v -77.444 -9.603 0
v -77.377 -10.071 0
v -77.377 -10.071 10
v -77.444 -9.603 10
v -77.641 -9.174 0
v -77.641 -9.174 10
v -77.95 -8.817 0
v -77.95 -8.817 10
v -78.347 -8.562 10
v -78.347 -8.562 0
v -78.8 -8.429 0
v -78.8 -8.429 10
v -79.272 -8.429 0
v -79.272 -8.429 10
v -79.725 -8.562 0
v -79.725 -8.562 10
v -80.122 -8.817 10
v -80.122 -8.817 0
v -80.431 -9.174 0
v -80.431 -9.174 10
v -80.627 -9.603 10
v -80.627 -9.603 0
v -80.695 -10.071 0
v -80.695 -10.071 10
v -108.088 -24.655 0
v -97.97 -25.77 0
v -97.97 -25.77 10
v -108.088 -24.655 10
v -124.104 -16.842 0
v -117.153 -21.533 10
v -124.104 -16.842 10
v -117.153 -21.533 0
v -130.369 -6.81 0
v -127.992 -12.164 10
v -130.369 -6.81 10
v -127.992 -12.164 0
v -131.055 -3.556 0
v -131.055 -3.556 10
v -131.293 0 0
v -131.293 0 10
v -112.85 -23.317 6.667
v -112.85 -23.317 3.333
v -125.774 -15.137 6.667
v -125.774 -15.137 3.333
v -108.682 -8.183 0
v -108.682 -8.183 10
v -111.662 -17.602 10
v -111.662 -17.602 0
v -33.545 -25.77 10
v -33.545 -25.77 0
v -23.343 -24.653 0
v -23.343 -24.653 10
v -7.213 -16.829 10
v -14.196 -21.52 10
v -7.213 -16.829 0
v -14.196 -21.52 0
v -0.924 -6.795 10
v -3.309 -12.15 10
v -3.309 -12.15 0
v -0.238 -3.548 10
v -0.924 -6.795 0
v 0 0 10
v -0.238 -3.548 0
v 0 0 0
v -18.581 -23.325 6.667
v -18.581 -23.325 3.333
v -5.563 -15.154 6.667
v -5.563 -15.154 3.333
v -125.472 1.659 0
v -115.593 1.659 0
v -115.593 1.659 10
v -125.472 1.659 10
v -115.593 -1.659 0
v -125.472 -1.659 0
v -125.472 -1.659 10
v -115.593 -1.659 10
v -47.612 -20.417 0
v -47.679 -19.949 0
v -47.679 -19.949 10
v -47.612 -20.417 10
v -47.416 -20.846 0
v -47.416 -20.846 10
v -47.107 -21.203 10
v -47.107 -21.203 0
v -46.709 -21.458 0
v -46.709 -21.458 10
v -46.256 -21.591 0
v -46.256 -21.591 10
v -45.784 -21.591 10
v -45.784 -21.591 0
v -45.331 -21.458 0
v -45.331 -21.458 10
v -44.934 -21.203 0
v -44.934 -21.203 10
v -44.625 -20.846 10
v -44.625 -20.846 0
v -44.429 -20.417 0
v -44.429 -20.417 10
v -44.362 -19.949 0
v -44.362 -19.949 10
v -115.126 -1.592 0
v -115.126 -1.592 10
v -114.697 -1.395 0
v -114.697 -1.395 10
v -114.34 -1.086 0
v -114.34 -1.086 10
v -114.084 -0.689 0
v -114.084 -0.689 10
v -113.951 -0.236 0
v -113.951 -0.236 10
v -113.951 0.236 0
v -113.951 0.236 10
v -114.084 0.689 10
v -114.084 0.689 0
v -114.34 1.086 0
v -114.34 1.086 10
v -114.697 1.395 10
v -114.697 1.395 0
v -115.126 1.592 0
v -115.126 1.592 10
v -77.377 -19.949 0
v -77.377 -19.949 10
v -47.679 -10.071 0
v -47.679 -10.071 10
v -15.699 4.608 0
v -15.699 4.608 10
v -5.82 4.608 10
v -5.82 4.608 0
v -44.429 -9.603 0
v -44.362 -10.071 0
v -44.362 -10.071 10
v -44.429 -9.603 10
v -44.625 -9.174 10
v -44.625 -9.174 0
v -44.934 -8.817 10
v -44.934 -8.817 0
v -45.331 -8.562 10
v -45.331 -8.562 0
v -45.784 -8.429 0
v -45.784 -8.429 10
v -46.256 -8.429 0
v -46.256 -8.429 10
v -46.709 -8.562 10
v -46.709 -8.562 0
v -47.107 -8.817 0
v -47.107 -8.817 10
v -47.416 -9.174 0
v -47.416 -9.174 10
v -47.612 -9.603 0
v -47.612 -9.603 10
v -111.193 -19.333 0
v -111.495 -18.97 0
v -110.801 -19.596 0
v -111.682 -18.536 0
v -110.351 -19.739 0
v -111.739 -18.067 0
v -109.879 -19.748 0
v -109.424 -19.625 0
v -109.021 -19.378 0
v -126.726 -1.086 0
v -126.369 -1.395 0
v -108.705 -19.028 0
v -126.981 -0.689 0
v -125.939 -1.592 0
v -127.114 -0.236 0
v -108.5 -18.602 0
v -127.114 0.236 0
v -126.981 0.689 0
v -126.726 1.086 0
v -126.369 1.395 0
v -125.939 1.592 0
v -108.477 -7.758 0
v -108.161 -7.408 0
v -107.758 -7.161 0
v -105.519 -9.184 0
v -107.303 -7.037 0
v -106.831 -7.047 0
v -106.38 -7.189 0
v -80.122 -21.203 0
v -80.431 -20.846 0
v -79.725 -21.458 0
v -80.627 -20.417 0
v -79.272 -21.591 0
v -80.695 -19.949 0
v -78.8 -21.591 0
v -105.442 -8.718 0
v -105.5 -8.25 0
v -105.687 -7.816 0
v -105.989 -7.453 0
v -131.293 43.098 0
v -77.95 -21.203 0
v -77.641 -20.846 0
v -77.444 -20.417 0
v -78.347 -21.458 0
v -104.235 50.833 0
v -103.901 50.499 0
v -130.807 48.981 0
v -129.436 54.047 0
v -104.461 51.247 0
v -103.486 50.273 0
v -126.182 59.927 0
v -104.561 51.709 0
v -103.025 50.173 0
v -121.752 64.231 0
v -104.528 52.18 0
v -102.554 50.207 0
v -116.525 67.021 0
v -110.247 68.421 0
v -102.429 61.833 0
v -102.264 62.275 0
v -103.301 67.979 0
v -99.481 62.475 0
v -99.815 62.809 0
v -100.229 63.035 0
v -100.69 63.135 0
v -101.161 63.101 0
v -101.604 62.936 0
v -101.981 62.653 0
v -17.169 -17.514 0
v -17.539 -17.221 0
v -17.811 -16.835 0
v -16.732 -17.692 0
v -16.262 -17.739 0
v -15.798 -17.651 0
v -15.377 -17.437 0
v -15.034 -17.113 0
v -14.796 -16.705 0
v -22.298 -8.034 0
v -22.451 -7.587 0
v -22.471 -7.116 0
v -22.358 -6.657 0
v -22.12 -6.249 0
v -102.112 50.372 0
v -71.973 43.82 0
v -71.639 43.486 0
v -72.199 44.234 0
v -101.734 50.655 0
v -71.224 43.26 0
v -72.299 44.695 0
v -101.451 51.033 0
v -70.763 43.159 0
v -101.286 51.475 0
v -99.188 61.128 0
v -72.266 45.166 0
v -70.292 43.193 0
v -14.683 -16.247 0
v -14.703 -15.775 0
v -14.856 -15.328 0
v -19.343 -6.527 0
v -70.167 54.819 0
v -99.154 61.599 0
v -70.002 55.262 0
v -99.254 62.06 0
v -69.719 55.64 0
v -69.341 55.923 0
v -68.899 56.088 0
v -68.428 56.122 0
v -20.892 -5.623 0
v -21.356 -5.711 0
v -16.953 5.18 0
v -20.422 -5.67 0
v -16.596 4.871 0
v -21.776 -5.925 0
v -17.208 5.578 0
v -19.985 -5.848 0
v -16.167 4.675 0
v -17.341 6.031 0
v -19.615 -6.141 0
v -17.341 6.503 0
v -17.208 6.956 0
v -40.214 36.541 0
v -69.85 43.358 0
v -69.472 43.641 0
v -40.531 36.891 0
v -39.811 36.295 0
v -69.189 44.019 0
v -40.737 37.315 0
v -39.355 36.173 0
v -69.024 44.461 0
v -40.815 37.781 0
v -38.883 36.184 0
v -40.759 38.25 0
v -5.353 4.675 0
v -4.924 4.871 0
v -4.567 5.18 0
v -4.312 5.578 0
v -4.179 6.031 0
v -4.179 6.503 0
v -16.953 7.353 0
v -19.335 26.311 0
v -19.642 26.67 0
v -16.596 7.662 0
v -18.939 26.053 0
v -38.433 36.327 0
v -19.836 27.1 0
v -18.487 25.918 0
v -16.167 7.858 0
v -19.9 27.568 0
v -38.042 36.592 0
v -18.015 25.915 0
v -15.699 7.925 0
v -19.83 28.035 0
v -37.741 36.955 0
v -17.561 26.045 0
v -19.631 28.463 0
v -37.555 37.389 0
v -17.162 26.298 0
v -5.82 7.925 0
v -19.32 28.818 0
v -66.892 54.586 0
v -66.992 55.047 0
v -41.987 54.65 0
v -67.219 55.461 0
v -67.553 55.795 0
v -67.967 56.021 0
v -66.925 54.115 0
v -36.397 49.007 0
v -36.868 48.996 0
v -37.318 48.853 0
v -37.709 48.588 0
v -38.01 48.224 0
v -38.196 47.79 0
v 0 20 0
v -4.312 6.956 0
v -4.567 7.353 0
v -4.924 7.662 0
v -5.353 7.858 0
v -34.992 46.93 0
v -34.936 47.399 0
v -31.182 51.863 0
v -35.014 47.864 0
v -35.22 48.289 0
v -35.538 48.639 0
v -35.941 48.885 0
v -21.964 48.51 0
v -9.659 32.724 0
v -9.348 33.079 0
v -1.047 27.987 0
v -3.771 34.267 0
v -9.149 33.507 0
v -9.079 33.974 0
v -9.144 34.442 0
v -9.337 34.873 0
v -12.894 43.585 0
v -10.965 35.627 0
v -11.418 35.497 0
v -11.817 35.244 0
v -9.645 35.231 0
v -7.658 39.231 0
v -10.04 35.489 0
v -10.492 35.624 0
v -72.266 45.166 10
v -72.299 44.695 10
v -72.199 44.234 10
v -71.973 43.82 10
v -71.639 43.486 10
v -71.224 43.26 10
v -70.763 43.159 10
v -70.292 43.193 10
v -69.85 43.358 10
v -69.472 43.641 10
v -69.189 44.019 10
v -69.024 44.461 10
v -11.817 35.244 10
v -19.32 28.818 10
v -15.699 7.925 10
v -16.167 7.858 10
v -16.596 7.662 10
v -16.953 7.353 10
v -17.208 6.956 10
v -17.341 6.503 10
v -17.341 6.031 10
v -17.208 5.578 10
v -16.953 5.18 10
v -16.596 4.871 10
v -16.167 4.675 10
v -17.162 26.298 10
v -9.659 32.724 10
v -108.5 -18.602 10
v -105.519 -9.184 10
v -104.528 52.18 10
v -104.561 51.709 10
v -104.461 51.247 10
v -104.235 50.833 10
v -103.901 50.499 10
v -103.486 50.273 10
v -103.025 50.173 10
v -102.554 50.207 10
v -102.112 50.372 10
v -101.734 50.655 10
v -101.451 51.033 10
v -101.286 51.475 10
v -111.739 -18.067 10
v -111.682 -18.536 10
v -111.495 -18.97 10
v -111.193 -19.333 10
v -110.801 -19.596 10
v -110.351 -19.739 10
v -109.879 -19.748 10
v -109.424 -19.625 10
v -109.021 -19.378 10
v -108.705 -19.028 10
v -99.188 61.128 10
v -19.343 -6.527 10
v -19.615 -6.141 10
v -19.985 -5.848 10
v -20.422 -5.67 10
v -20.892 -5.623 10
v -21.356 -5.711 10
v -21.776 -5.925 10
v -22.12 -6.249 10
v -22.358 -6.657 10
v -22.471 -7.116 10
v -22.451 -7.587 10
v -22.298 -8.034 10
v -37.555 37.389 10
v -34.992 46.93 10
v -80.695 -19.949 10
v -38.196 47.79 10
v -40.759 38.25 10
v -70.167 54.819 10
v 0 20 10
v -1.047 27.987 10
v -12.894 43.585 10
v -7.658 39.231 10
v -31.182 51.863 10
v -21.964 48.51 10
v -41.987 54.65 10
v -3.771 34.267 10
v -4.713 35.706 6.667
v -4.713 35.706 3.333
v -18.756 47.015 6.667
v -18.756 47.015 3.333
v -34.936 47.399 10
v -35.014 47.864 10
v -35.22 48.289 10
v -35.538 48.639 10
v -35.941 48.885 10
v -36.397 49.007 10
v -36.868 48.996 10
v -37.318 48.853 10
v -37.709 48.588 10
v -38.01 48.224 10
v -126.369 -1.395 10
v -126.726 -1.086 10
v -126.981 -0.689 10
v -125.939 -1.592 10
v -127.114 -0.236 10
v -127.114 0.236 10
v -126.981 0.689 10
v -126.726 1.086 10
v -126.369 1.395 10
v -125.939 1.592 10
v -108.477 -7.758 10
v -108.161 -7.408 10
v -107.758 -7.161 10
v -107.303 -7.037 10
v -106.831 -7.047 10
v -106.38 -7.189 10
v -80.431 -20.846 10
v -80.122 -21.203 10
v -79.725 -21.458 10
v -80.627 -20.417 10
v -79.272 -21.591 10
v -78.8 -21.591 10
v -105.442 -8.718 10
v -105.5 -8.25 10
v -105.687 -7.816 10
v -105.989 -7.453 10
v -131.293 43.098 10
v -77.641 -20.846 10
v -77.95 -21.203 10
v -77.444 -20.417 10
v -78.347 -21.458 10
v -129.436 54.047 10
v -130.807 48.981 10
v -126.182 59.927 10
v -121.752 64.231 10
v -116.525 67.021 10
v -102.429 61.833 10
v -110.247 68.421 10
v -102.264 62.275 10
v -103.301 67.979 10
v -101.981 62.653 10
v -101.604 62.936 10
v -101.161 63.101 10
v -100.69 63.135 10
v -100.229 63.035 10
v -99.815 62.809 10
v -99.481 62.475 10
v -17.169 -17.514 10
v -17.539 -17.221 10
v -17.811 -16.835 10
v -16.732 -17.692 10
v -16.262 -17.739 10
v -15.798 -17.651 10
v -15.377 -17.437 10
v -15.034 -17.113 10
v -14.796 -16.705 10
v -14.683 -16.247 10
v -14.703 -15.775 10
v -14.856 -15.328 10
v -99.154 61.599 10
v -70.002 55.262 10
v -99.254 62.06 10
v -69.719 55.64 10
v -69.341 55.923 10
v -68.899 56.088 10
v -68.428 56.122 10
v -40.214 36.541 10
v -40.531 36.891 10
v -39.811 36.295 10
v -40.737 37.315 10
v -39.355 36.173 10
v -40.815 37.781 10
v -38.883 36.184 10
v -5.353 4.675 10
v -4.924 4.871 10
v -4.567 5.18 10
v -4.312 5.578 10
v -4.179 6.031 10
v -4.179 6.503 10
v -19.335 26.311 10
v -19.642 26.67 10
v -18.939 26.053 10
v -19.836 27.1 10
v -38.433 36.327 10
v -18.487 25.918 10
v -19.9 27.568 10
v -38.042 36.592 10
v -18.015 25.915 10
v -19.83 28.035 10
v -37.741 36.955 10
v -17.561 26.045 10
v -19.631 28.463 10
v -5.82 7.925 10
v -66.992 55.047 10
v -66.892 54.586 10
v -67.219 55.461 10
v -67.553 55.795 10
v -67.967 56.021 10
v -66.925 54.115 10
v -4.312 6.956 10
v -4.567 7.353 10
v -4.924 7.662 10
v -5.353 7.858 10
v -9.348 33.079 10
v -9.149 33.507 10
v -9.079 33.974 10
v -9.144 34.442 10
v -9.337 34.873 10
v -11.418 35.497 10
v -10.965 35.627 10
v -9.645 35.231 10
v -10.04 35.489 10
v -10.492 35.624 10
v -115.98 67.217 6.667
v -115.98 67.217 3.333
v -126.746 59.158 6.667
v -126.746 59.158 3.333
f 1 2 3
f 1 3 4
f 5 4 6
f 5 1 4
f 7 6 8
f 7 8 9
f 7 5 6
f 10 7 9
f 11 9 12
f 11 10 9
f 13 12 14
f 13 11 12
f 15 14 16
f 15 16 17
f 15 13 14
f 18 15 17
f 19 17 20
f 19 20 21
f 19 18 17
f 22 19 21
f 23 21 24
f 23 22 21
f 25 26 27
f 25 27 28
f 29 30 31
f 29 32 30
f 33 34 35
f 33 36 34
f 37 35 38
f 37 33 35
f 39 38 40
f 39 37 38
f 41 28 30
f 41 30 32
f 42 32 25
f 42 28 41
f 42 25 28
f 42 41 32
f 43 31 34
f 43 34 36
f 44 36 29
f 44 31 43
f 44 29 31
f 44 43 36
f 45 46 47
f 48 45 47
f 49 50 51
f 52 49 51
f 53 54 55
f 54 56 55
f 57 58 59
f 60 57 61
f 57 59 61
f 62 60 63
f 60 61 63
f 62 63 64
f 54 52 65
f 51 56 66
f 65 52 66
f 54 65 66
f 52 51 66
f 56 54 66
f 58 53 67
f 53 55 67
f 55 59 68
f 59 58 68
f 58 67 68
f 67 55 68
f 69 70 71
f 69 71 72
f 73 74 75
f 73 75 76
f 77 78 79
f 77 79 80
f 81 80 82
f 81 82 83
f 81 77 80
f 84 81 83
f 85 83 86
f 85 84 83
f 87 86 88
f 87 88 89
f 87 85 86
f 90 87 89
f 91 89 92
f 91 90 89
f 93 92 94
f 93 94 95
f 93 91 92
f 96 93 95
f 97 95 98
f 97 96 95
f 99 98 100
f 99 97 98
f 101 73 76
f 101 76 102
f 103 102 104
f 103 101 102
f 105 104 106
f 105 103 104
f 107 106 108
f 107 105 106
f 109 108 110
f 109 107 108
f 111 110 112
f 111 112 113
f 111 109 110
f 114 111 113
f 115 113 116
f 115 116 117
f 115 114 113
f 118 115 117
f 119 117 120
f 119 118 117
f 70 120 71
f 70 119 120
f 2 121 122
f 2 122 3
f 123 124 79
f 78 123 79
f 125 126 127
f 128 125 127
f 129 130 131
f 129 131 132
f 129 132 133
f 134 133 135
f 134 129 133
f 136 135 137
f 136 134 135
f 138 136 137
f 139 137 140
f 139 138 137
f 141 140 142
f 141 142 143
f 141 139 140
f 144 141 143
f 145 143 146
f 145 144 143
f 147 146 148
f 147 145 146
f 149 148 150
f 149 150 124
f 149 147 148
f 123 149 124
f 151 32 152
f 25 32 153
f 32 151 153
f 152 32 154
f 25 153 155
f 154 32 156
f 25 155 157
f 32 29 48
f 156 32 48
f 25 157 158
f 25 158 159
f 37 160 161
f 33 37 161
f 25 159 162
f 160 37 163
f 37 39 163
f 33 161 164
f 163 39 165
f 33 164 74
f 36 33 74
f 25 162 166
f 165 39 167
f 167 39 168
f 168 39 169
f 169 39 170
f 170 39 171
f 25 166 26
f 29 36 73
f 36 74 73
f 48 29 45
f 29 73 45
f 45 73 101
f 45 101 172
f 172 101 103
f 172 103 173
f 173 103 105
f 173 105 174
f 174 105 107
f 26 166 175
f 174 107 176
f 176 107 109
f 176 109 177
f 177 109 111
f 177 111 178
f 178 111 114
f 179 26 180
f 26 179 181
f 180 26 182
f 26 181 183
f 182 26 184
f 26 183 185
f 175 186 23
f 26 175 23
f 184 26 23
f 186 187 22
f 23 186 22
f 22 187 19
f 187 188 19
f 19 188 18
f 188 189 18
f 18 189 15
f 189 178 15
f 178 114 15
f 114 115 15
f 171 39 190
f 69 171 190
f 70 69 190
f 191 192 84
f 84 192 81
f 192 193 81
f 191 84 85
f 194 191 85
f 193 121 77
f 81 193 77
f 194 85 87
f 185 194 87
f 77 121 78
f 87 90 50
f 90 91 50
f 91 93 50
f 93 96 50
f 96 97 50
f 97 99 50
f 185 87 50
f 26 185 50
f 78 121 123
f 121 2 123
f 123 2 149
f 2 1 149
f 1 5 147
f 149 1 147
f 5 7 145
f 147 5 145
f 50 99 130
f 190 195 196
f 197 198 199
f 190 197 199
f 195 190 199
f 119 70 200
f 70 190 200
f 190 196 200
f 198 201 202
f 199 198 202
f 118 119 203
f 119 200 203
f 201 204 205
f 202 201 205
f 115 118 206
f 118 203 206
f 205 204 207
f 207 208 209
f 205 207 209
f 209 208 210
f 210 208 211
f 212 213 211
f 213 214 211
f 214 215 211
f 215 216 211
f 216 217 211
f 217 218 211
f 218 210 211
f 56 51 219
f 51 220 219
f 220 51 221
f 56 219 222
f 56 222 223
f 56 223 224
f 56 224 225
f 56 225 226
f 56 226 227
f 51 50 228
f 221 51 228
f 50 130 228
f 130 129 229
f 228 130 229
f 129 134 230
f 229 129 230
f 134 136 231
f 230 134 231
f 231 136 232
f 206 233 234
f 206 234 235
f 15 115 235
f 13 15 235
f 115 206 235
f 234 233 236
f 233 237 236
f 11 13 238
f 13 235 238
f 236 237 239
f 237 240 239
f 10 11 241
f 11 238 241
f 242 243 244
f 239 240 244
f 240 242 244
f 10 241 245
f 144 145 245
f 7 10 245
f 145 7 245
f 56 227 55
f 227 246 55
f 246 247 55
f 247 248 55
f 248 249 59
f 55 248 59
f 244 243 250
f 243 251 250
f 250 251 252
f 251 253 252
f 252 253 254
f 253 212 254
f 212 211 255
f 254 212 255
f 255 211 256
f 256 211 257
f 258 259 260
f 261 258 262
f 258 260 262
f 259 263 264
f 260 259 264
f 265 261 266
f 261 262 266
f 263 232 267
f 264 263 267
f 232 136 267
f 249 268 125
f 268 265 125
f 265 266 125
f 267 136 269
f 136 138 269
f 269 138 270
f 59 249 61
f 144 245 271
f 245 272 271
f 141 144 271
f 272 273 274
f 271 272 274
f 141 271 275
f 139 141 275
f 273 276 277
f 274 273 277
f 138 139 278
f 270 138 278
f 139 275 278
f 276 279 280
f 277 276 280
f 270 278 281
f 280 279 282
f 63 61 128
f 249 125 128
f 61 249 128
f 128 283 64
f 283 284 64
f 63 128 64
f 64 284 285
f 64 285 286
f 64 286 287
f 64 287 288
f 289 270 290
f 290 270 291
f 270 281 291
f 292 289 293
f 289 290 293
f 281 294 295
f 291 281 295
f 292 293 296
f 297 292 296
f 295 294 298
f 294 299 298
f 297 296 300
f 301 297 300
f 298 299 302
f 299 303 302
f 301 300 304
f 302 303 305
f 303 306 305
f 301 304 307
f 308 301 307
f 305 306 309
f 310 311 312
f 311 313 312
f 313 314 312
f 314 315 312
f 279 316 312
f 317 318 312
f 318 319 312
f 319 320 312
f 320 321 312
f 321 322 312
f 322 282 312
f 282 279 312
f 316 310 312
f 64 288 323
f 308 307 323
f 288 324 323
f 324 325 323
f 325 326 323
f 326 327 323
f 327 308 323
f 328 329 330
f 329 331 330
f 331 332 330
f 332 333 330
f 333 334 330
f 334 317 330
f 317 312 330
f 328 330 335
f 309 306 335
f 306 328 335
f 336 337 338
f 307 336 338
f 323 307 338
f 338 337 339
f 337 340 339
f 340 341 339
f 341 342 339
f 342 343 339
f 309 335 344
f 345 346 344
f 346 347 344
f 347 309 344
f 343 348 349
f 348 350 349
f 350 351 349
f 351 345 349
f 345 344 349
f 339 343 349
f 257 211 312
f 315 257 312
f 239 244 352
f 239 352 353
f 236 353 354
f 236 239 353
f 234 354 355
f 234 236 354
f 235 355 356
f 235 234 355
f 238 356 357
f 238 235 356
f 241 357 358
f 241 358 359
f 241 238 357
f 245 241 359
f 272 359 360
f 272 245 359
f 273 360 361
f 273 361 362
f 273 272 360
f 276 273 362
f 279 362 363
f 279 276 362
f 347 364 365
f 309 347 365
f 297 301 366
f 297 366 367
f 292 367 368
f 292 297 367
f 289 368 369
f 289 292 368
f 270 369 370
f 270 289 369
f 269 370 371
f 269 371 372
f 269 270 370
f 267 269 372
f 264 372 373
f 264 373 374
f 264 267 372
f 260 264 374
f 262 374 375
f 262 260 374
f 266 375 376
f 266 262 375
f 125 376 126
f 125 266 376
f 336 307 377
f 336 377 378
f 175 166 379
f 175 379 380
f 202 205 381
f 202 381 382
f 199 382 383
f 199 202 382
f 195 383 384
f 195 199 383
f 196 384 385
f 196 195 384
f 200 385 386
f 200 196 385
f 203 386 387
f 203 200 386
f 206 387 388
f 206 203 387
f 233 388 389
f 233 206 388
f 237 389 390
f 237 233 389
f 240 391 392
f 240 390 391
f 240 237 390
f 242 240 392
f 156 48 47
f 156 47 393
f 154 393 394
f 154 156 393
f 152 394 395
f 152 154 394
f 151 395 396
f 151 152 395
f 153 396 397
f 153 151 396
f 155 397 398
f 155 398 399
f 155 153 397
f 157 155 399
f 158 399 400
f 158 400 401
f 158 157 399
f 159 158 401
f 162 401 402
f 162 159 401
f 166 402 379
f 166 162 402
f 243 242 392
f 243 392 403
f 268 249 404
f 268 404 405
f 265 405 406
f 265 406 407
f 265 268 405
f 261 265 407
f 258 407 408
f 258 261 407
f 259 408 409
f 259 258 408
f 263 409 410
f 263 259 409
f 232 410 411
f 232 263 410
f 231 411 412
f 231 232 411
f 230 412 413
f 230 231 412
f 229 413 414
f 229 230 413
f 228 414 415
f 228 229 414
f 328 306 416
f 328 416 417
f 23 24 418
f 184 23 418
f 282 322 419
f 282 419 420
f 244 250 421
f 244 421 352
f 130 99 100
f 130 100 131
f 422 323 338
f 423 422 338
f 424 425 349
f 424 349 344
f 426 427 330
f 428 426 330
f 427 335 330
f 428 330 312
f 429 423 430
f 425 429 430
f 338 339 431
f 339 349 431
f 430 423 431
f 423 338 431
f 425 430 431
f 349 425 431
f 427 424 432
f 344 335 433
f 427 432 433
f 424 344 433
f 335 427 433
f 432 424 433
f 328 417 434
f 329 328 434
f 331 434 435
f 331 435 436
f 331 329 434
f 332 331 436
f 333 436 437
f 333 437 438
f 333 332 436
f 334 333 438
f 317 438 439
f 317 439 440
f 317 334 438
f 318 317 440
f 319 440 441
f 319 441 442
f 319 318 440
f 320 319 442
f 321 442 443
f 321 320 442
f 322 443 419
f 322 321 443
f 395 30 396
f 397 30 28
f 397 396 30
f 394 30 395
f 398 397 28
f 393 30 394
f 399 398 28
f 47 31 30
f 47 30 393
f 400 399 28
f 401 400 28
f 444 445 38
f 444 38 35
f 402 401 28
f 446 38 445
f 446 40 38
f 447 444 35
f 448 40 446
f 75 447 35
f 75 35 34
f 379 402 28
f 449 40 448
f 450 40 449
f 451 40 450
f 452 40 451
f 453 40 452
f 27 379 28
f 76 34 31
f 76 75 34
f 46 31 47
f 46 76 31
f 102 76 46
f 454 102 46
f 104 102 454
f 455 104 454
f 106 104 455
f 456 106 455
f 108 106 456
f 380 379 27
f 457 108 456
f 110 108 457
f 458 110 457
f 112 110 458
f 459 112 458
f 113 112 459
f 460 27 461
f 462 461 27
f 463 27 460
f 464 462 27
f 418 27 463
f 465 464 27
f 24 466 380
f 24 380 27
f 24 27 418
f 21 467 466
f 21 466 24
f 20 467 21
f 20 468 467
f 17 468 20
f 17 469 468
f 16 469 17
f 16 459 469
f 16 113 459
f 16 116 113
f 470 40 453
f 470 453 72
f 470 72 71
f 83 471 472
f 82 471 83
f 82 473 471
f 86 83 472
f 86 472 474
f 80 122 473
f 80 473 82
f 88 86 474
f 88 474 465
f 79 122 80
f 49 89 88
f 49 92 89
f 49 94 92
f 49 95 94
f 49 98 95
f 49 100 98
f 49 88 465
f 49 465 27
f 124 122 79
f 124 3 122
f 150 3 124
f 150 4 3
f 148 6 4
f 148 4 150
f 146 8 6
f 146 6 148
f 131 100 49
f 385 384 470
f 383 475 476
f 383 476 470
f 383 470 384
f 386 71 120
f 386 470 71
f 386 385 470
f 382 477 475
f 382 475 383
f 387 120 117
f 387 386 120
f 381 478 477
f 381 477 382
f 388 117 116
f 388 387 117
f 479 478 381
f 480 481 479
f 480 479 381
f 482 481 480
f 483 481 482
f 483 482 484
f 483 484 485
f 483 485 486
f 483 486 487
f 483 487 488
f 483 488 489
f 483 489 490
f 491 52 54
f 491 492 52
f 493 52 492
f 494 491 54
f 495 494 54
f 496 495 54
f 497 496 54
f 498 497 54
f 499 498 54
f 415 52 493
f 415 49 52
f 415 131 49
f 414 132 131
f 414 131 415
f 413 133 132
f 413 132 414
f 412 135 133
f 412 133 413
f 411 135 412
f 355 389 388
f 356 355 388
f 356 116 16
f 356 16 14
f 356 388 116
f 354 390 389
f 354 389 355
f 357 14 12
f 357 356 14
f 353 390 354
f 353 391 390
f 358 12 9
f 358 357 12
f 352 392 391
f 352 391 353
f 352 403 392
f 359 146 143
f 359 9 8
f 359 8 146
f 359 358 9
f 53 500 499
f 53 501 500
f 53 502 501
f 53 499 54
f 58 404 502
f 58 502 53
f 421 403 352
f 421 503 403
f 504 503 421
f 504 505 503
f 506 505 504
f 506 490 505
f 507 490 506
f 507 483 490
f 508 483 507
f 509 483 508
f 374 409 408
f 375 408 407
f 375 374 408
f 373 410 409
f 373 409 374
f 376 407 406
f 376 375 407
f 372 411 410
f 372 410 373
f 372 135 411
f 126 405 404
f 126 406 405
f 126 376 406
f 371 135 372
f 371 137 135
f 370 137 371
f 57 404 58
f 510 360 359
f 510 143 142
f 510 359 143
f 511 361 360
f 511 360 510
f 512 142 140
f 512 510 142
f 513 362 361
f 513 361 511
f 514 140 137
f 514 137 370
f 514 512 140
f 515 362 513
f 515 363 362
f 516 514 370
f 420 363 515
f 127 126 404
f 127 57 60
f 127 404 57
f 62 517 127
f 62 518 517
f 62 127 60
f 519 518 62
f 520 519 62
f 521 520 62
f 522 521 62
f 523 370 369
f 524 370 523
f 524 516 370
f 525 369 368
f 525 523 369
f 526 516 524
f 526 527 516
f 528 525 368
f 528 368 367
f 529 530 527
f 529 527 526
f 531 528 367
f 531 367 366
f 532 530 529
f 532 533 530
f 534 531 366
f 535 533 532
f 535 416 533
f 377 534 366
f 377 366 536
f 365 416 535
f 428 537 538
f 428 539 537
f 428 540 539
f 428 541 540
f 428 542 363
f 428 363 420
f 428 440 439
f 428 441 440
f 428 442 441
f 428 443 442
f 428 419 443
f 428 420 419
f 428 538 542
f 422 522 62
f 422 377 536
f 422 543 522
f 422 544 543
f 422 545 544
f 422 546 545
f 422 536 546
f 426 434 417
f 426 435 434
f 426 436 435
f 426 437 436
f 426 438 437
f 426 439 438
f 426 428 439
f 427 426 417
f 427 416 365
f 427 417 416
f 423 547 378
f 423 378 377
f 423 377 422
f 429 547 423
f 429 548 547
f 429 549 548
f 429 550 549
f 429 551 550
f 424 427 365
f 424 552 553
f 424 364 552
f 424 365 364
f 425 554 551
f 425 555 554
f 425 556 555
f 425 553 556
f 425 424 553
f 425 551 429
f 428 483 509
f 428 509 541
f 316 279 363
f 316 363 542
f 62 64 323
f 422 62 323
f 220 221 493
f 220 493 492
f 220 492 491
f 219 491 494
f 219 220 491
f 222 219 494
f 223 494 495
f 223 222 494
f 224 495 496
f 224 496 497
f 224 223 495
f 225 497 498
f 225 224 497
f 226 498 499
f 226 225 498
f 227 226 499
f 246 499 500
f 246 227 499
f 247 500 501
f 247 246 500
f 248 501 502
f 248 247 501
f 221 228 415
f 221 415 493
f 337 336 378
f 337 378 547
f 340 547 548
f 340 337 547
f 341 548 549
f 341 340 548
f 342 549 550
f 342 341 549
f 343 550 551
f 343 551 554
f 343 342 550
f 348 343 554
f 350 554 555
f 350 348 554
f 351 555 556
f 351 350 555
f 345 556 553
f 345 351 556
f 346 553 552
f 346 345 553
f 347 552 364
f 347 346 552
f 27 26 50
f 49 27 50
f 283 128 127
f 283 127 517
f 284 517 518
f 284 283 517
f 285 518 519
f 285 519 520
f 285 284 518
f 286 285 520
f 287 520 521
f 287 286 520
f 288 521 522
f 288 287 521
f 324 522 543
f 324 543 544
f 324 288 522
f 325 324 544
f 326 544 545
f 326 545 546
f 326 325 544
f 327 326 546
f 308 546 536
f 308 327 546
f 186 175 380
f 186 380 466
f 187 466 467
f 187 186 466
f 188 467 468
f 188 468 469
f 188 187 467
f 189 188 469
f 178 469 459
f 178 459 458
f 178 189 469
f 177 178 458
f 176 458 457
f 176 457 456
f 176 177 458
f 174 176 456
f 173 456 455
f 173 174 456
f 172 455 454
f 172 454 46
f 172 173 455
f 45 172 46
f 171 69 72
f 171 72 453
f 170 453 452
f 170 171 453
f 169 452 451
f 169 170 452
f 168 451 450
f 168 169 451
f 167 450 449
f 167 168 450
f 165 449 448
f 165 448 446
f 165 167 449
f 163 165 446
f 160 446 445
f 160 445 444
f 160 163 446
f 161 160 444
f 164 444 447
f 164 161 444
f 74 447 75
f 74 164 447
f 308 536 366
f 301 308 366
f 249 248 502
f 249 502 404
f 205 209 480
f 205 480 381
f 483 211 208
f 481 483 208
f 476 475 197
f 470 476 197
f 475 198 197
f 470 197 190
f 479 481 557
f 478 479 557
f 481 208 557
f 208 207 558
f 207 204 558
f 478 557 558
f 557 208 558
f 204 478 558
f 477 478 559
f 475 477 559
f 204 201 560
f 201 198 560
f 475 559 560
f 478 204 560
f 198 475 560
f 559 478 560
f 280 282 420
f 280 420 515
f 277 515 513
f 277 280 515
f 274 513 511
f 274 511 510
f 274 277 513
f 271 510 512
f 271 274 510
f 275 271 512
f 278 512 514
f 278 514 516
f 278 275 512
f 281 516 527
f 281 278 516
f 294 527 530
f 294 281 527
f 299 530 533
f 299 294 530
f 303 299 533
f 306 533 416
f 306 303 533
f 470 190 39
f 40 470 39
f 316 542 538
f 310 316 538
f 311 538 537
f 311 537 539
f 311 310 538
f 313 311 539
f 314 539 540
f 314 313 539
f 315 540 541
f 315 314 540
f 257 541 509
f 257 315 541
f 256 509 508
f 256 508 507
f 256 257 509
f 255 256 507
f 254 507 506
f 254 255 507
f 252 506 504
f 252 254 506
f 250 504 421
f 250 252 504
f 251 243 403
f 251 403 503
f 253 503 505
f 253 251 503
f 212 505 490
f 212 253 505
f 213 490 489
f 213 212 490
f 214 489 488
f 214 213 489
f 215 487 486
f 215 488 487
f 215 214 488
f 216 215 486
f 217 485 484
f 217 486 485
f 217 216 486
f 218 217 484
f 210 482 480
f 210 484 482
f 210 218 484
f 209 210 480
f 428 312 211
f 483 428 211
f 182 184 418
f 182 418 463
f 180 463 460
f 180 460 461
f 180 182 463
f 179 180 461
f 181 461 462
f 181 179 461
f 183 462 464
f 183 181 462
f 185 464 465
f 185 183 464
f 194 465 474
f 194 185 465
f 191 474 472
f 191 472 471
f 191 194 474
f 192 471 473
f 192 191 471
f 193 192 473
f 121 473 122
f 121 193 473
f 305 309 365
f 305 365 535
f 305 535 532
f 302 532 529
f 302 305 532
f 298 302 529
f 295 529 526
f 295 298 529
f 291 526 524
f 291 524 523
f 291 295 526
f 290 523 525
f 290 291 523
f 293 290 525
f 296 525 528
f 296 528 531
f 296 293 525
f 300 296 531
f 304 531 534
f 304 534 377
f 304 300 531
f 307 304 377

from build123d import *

# Parameters (mm, degrees)
EXTRUDE_1_DEPTH       = 10
CUT_EXTRUDE_1_DEPTH   = 149.427210809
PATTERN_CURVE_1_DEPTH = 10


# Read off the part's stored shape, not the designer's step: Кривая1
with BuildPart() as part:
    # Эскиз1_fr → Бобышка-Вытянуть1 (new body)
    with BuildSketch(Plane.XY):
        with BuildLine():
            Line((0, 0), (0, 20))
            add(Edge.make_bspline(
                [(0, 20), (0, 38.146025899), (-14.209474182, 48.611098897), (-41.986949672, 54.649680525)],
                knots=[0, 0, 0, 0, 1, 1, 1, 1], degree=3))
            Line((-41.986949672, 54.649680525), (-103.301225383, 67.978870897))
            add(Edge.make_bspline(
                [(-103.301225383, 67.978870897), (-115.500001367, 70.63077872), (-131.292525164, 63.393306184), (-131.292525164, 43.097715536)],
                knots=[0, 0, 0, 0, 1, 1, 1, 1], degree=3))
            Line((-131.292525164, 43.097715536), (-131.292525164, 0))
            add(Edge.make_bspline(
                [(-97.969549234, -25.769768053), (-112.011160689, -25.769768053), (-131.292525164, -19.025155818), (-131.292525164, 0)],
                knots=[0, 0, 0, 0, 1, 1, 1, 1], degree=3))
            Line((-97.969549234, -25.769768053), (-33.545129103, -25.769768053))
            add(Edge.make_bspline(
                [(-33.545129103, -25.769768053), (-19.444866568, -25.769768053), (0, -19.063757455), (0, 0)],
                knots=[0, 0, 0, 0, 1, 1, 1, 1], degree=3))
        make_face()
    extrude(amount=EXTRUDE_1_DEPTH)

    # Эскиз2_fr → Вырез-Вытянуть1 (cut, through all)
    with BuildSketch(Plane(origin=(0, 0, 0), x_dir=(-1, 0, 0), z_dir=(0, 0, -1))):
        with BuildLine():
            Line((102.429251955, 61.832882372), (104.527789693, 52.179608775))
            ThreePointArc((104.527789693, 52.179608775), (103.259303337, 50.206407776), (101.286102339, 51.474894133))
            Line((101.286102339, 51.474894133), (99.1875646, 61.128167729))
            ThreePointArc((99.1875646, 61.128167729), (100.456050956, 63.101368728), (102.429251955, 61.832882372))
        make_face()
    extrude(amount=-CUT_EXTRUDE_1_DEPTH, mode=Mode.SUBTRACT)

    # Кривая1 outline → Кривая1 (cut)
    with BuildSketch(Plane.XY):
        with BuildLine():
            ThreePointArc((-66.925496948, 54.114674761), (-68.193983304, 56.08787576), (-70.167184303, 54.819389404))
            Line((-70.167184303, 54.819389404), (-72.265722041, 45.166115807))
            ThreePointArc((-72.265722041, 45.166115807), (-70.997235685, 43.192914809), (-69.024034687, 44.461401165))
            Line((-69.024034687, 44.461401165), (-66.925496948, 54.114674761))
        make_face()
        with BuildLine():
            ThreePointArc((-34.992445024, 46.929960503), (-36.164147849, 48.962124942), (-38.196312288, 47.790422117))
            Line((-38.196312288, 47.790422117), (-40.758641861, 38.249771252))
            ThreePointArc((-40.758641861, 38.249771252), (-39.586939036, 36.217606813), (-37.554774597, 37.389309638))
            Line((-37.554774597, 37.389309638), (-34.992445024, 46.929960503))
        make_face()
        with BuildLine():
            ThreePointArc((-9.659083383, 32.724100966), (-9.478152386, 35.062870683), (-11.816922103, 35.243801681))
            Line((-11.816922103, 35.243801681), (-19.320224464, 28.818071725))
            ThreePointArc((-19.320224464, 28.818071725), (-19.501155461, 26.479302007), (-17.162385743, 26.298371011))
            Line((-17.162385743, 26.298371011), (-9.659083383, 32.724100966))
        make_face()
        with BuildLine():
            ThreePointArc((-5.820481715, 4.607864038), (-4.161780443, 6.266565309), (-5.820481715, 7.925266581))
            Line((-5.820481715, 7.925266581), (-15.699224133, 7.925266581))
            ThreePointArc((-15.699224133, 7.925266581), (-17.357925405, 6.266565309), (-15.699224133, 4.607864038))
            Line((-15.699224133, 4.607864038), (-5.820481715, 4.607864038))
        make_face()
        with BuildLine():
            ThreePointArc((-17.811005152, -16.834920175), (-15.579870133, -17.559224215), (-14.855566092, -15.328089196))
            Line((-14.855566092, -15.328089196), (-19.342689651, -6.527221402))
            ThreePointArc((-19.342689651, -6.527221402), (-21.573824671, -5.802917361), (-22.298128711, -8.034052381))
            Line((-22.298128711, -8.034052381), (-17.811005152, -16.834920175))
        make_face()
        with BuildLine():
            ThreePointArc((-47.67905304, -19.949286338), (-46.020351768, -21.607987609), (-44.361650497, -19.949286338))
            Line((-44.361650497, -19.949286338), (-44.361650497, -10.070543919))
            ThreePointArc((-44.361650497, -10.070543919), (-46.020351768, -8.411842648), (-47.67905304, -10.070543919))
            Line((-47.67905304, -10.070543919), (-47.67905304, -19.949286338))
        make_face()
        with BuildLine():
            ThreePointArc((-80.694656818, -19.949286338), (-79.035955546, -21.607987609), (-77.377254274, -19.949286338))
            Line((-77.377254274, -19.949286338), (-77.377254274, -10.070543919))
            ThreePointArc((-77.377254274, -10.070543919), (-79.035955546, -8.411842648), (-80.694656818, -10.070543919))
            Line((-80.694656818, -10.070543919), (-80.694656818, -19.949286338))
        make_face()
        with BuildLine():
            ThreePointArc((-111.662441641, -17.601639491), (-110.581423079, -19.683460493), (-108.499602077, -18.602441931))
            Line((-108.499602077, -18.602441931), (-105.519357928, -9.18396559))
            ThreePointArc((-105.519357928, -9.18396559), (-106.60037649, -7.102144588), (-108.682197492, -8.18316315))
            Line((-108.682197492, -8.18316315), (-111.662441641, -17.601639491))
        make_face()
        with BuildLine():
            ThreePointArc((-125.472043449, 1.658701272), (-127.130744721, 0), (-125.472043449, -1.658701272))
            Line((-125.472043449, -1.658701272), (-115.593301031, -1.658701272))
            ThreePointArc((-115.593301031, -1.658701272), (-113.934599759, 0), (-115.593301031, 1.658701272))
            Line((-115.593301031, 1.658701272), (-125.472043449, 1.658701272))
        make_face()
    extrude(amount=PATTERN_CURVE_1_DEPTH, mode=Mode.SUBTRACT)


solid = part.part
